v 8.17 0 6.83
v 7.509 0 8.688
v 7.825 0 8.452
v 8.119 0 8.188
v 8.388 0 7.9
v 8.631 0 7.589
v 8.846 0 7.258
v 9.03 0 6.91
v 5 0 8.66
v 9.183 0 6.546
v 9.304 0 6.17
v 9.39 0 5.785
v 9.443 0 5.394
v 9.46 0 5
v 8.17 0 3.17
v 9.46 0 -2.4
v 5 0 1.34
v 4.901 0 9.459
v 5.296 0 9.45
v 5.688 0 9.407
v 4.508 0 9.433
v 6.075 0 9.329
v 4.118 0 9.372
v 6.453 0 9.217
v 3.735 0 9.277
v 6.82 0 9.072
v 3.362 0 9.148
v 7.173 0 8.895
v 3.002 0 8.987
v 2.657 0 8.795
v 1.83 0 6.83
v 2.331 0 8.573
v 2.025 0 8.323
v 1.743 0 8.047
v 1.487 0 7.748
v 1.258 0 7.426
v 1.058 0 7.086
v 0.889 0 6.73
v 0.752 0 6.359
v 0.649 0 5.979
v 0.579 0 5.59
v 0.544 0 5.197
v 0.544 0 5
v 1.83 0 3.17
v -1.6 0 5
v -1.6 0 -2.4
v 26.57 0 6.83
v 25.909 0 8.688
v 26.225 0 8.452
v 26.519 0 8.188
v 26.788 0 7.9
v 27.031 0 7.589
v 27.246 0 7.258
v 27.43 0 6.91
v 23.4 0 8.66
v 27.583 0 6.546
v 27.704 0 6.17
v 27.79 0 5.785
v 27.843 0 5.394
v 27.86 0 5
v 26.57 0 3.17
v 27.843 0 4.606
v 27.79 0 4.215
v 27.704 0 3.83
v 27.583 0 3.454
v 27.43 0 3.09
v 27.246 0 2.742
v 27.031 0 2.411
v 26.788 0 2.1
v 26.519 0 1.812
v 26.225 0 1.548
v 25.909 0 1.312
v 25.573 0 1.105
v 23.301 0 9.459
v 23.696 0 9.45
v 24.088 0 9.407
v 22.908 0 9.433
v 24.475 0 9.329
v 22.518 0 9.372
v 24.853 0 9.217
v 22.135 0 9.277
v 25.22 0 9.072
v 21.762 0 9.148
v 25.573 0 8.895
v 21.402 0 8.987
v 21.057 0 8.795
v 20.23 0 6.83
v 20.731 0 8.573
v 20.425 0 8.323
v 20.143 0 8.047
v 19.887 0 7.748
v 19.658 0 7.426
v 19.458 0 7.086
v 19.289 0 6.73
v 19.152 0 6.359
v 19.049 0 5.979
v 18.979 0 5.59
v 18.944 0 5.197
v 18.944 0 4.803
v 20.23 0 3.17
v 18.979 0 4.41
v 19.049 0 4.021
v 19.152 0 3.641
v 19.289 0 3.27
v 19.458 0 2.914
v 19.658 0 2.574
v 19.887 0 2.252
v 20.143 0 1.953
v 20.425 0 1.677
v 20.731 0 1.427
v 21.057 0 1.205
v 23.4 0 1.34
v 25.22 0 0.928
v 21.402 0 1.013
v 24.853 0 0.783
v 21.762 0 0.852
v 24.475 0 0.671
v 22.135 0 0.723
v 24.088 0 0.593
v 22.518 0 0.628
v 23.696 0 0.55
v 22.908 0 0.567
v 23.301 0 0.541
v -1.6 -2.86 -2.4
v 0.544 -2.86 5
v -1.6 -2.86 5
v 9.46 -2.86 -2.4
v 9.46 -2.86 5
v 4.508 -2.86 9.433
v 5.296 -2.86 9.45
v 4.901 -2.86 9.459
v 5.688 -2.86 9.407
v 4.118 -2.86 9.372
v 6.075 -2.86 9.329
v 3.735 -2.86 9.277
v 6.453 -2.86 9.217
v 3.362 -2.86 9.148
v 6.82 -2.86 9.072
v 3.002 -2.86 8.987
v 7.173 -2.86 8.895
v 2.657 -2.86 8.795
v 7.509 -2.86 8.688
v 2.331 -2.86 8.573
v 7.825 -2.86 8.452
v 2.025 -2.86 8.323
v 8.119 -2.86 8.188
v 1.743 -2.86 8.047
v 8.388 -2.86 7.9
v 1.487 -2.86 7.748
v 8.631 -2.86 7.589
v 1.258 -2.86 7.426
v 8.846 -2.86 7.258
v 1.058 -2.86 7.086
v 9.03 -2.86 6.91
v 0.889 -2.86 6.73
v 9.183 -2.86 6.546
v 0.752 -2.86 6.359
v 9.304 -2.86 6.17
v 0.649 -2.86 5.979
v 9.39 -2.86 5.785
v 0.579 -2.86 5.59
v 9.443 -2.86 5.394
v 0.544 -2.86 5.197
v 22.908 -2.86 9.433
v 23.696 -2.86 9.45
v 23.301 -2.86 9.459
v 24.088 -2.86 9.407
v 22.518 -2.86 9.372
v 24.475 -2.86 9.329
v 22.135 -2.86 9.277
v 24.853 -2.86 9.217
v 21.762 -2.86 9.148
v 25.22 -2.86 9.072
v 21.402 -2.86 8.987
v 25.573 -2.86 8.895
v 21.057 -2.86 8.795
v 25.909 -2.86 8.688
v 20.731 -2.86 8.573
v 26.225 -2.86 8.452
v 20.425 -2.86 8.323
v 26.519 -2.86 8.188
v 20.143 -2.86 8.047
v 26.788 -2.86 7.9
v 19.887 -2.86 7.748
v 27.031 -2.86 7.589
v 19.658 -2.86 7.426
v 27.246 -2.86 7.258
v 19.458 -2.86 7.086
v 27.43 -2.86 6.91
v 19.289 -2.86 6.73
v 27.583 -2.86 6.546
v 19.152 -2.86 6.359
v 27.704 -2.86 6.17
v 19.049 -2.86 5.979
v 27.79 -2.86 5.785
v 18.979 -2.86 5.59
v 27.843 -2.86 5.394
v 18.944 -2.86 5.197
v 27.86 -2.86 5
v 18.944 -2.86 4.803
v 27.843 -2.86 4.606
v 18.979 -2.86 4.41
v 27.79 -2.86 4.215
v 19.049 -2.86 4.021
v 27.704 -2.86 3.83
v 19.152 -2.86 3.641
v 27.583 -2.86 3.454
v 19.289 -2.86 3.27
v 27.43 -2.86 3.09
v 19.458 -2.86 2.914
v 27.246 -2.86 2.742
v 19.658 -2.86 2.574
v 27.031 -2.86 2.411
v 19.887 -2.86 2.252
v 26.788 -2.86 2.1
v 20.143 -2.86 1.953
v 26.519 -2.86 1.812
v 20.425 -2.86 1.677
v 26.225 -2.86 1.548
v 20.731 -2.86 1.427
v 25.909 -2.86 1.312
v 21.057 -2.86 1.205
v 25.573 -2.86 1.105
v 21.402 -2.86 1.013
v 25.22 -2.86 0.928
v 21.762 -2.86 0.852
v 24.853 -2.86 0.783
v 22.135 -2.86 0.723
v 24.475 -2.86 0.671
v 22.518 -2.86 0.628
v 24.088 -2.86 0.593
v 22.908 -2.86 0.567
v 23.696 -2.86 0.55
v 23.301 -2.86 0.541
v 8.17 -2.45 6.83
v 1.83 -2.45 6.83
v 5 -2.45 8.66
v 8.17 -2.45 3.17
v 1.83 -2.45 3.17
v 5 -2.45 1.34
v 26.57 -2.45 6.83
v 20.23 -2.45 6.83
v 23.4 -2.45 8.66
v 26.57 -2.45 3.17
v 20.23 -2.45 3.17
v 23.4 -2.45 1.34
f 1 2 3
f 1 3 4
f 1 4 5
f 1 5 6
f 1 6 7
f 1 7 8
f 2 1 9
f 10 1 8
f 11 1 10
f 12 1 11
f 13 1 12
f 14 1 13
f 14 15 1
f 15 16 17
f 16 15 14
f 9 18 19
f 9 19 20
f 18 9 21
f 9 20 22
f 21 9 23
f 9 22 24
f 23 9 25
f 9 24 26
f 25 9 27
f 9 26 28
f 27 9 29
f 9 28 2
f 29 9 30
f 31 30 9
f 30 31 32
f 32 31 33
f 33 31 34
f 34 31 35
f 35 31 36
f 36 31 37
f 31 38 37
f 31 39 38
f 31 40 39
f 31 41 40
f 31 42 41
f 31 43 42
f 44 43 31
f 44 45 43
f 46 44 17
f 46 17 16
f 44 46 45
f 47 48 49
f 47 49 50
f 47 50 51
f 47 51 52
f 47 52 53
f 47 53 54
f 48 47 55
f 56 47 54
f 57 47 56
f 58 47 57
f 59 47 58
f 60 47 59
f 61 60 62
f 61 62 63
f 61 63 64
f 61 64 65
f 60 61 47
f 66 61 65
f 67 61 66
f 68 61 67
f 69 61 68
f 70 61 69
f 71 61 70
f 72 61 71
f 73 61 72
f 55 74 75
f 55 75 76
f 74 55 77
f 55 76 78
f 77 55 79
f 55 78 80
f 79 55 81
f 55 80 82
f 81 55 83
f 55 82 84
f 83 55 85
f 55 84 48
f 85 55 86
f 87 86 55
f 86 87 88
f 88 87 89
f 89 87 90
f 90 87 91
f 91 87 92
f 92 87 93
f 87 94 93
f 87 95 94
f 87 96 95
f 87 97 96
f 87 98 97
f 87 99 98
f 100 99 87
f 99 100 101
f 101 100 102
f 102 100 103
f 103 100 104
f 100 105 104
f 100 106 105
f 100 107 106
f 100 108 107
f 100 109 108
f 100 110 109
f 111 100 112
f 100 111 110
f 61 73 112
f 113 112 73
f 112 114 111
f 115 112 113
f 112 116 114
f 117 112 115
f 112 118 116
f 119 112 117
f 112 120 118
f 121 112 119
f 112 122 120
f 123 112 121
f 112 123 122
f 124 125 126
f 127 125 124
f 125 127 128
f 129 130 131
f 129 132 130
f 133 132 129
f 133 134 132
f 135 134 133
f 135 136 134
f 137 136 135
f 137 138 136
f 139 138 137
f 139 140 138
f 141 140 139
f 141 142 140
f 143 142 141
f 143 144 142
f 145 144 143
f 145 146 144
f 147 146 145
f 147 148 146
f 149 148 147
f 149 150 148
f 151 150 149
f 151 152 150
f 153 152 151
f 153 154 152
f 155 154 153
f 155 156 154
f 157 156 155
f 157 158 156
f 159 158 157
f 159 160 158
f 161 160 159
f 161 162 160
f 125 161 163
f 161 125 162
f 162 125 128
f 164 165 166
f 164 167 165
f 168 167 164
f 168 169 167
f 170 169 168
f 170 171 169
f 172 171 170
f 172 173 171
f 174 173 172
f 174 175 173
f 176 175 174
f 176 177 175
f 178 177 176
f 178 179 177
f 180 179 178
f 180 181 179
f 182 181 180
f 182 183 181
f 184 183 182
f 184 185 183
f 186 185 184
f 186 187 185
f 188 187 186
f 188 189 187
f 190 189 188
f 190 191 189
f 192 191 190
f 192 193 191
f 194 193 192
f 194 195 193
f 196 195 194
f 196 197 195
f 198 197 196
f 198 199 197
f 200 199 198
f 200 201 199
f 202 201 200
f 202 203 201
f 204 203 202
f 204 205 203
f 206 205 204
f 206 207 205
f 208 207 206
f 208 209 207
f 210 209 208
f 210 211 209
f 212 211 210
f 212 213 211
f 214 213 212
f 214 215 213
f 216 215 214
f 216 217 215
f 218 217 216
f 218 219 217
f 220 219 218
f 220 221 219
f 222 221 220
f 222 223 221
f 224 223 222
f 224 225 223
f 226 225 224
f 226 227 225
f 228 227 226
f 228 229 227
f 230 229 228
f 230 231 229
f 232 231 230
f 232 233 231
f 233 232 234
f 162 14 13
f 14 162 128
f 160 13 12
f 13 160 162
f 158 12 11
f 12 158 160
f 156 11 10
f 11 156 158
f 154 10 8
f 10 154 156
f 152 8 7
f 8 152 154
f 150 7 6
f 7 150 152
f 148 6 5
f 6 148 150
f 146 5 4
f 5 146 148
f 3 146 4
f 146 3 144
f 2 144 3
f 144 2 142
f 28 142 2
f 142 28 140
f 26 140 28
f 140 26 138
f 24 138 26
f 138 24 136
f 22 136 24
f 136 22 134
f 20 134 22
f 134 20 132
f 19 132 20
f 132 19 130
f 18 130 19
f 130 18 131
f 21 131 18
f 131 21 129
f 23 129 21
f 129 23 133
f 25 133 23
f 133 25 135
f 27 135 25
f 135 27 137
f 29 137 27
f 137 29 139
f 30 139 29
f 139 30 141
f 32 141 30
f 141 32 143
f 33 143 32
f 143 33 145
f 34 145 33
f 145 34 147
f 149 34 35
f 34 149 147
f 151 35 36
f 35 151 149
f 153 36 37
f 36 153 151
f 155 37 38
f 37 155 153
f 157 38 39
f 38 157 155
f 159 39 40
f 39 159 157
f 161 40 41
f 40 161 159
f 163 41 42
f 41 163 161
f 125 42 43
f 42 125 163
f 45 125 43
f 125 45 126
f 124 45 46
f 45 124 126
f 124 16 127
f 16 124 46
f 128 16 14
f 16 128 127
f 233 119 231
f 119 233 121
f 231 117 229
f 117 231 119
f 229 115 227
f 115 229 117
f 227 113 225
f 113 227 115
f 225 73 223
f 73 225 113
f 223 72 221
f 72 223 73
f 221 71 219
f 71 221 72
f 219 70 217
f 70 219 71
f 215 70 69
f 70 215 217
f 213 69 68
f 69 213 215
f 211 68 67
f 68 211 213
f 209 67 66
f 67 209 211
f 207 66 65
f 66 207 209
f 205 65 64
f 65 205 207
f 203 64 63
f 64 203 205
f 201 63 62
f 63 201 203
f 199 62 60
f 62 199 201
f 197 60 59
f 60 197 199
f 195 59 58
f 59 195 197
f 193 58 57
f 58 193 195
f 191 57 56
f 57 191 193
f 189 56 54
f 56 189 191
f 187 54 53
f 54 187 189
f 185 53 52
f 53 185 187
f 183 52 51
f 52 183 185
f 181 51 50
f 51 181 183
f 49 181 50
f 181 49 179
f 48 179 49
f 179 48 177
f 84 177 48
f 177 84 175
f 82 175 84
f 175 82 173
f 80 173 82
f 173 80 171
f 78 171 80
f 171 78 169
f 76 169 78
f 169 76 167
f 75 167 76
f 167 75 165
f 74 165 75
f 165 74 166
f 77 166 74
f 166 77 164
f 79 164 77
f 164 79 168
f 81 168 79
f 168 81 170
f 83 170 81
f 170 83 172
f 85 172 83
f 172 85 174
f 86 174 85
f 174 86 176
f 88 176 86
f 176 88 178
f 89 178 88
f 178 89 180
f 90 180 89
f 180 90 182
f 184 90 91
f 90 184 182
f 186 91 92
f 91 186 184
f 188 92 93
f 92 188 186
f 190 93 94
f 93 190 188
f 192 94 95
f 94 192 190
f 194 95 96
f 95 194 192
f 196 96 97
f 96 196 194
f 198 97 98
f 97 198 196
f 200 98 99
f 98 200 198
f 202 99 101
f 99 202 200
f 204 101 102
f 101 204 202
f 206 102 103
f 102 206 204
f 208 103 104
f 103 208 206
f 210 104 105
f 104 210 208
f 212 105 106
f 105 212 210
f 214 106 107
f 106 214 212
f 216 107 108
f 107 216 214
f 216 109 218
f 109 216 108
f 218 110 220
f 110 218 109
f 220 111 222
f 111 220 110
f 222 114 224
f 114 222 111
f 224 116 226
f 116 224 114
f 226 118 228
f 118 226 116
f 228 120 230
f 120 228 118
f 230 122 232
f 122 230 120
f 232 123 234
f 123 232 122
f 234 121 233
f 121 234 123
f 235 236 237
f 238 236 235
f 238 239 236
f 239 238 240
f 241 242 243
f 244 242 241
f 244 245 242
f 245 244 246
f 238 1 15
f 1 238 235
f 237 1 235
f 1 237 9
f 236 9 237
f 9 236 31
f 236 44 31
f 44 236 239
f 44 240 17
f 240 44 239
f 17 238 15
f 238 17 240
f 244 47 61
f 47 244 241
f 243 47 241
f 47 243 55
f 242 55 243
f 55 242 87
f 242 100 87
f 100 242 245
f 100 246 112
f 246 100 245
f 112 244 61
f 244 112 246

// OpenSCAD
// Copyright (C) 2025 Arif K. Rafiq
// This program is free software: you can redistribute it and/or modify
// it under the terms of the GNU General Public License as published by
// the Free Software Foundation, either version 3 of the License, or
// (at your option) any later version.

// This program is distributed in the hope that it will be useful,
// but WITHOUT ANY WARRANTY; without even the implied warranty of
// MERCHANTABILITY or FITNESS FOR A PARTICULAR PURPOSE.  See the
// GNU General Public License for more details.

// You should have received a copy of the GNU General Public License
// along with this file.  If not, see <https://www.gnu.org/licenses/>,
// or write to: license@temperedoptimism.com


/* 
(b)readth       :(w)est (X-)   (c)enter (X0) (e)east (X+)
Vectors (v)     :(x), (y), (z)
Thicknesses (t) : Thicknesses to resolve 3D printer limits or rendering issues.
Proportion (p)  : container for grouping (r)adius and (i)ntensity into a singl 2d vector acccessed using .x and .y respectively
*/

// Fixed in example3.scad       // Set limits in customizer
/* [Thicknesses (x),(y),(z)] */
tFitGap = [0.16, 0.16, 0.16];   //[0.00:0.01:0.64] 
tWallMin = [0.40, 0.40, 0.16];  //[0.16:0.08:1.60] 
/* [Proportional (x):(Radius, (y):(i)ntensity] */
pHexSink = [3.5, 2.3];          //[0.10:0.02:20.00] 
/* [2D vectors (x), (y)] */
vTerminalW = [5.0, 5.0];        //[0.00:0.10:100] 
vTerminalE = [23.4, 5.0];       //[0.00:0.10:100] 
/* [Scalars] */
leadingEdge = 2.4; //[0.8:0.4:5.0]
flankEdge = 1.6; //[0.8:0.4:5.0]
bBoard = 28.4; //[20:0.1:100.0]
/* [Special ] */
fa0 = 4.0;     //[1:1:60]  
fs0 = 0.4;     //[0.1:0.1:4.0]  
fx0 = 2;       //[1,2,3,4,5,6,7,8,9,10]
/* [Hidden] */ 
tEps=0.01; 

/* Calucualted at run time. */
pHexSurround = [pHexSink.x + (tWallMin.x * 2) + tFitGap.x, pHexSink.y + tWallMin.y + tFitGap.y];

//30.00-35.00 Circles, Also look at the customizer!!
// Rotate
rotate([90,0,0]){
  difference(){

    linear_extrude(pHexSurround.y, convexity=fx0){ 
      polygon([[vTerminalW.x + pHexSurround.x, vTerminalW.y],
              [ vTerminalW.x + pHexSurround.x, -leadingEdge],
              [-flankEdge, -leadingEdge],       
              [-flankEdge, vTerminalW.y]]);
      translate(vTerminalW)  circle(pHexSurround.x, $fa=fa0, $fs=fs0); 
      translate(vTerminalE)  circle(pHexSurround.x, $fa=fa0, $fs=fs0 );
    }
    //hex pocket
    // Solve Conflicting bodies                       
    translate([0,0, -tEps]) linear_extrude(pHexSink.y + tFitGap.y, convexity=fx0){
      translate(vTerminalW)  rotate([0,0,30]) circle(pHexSink.x + tFitGap.y, $fn=6);
      translate(vTerminalE)  rotate([0,0,30]) circle(pHexSink.x + tFitGap.y, $fn=6);
    }
  }
}
